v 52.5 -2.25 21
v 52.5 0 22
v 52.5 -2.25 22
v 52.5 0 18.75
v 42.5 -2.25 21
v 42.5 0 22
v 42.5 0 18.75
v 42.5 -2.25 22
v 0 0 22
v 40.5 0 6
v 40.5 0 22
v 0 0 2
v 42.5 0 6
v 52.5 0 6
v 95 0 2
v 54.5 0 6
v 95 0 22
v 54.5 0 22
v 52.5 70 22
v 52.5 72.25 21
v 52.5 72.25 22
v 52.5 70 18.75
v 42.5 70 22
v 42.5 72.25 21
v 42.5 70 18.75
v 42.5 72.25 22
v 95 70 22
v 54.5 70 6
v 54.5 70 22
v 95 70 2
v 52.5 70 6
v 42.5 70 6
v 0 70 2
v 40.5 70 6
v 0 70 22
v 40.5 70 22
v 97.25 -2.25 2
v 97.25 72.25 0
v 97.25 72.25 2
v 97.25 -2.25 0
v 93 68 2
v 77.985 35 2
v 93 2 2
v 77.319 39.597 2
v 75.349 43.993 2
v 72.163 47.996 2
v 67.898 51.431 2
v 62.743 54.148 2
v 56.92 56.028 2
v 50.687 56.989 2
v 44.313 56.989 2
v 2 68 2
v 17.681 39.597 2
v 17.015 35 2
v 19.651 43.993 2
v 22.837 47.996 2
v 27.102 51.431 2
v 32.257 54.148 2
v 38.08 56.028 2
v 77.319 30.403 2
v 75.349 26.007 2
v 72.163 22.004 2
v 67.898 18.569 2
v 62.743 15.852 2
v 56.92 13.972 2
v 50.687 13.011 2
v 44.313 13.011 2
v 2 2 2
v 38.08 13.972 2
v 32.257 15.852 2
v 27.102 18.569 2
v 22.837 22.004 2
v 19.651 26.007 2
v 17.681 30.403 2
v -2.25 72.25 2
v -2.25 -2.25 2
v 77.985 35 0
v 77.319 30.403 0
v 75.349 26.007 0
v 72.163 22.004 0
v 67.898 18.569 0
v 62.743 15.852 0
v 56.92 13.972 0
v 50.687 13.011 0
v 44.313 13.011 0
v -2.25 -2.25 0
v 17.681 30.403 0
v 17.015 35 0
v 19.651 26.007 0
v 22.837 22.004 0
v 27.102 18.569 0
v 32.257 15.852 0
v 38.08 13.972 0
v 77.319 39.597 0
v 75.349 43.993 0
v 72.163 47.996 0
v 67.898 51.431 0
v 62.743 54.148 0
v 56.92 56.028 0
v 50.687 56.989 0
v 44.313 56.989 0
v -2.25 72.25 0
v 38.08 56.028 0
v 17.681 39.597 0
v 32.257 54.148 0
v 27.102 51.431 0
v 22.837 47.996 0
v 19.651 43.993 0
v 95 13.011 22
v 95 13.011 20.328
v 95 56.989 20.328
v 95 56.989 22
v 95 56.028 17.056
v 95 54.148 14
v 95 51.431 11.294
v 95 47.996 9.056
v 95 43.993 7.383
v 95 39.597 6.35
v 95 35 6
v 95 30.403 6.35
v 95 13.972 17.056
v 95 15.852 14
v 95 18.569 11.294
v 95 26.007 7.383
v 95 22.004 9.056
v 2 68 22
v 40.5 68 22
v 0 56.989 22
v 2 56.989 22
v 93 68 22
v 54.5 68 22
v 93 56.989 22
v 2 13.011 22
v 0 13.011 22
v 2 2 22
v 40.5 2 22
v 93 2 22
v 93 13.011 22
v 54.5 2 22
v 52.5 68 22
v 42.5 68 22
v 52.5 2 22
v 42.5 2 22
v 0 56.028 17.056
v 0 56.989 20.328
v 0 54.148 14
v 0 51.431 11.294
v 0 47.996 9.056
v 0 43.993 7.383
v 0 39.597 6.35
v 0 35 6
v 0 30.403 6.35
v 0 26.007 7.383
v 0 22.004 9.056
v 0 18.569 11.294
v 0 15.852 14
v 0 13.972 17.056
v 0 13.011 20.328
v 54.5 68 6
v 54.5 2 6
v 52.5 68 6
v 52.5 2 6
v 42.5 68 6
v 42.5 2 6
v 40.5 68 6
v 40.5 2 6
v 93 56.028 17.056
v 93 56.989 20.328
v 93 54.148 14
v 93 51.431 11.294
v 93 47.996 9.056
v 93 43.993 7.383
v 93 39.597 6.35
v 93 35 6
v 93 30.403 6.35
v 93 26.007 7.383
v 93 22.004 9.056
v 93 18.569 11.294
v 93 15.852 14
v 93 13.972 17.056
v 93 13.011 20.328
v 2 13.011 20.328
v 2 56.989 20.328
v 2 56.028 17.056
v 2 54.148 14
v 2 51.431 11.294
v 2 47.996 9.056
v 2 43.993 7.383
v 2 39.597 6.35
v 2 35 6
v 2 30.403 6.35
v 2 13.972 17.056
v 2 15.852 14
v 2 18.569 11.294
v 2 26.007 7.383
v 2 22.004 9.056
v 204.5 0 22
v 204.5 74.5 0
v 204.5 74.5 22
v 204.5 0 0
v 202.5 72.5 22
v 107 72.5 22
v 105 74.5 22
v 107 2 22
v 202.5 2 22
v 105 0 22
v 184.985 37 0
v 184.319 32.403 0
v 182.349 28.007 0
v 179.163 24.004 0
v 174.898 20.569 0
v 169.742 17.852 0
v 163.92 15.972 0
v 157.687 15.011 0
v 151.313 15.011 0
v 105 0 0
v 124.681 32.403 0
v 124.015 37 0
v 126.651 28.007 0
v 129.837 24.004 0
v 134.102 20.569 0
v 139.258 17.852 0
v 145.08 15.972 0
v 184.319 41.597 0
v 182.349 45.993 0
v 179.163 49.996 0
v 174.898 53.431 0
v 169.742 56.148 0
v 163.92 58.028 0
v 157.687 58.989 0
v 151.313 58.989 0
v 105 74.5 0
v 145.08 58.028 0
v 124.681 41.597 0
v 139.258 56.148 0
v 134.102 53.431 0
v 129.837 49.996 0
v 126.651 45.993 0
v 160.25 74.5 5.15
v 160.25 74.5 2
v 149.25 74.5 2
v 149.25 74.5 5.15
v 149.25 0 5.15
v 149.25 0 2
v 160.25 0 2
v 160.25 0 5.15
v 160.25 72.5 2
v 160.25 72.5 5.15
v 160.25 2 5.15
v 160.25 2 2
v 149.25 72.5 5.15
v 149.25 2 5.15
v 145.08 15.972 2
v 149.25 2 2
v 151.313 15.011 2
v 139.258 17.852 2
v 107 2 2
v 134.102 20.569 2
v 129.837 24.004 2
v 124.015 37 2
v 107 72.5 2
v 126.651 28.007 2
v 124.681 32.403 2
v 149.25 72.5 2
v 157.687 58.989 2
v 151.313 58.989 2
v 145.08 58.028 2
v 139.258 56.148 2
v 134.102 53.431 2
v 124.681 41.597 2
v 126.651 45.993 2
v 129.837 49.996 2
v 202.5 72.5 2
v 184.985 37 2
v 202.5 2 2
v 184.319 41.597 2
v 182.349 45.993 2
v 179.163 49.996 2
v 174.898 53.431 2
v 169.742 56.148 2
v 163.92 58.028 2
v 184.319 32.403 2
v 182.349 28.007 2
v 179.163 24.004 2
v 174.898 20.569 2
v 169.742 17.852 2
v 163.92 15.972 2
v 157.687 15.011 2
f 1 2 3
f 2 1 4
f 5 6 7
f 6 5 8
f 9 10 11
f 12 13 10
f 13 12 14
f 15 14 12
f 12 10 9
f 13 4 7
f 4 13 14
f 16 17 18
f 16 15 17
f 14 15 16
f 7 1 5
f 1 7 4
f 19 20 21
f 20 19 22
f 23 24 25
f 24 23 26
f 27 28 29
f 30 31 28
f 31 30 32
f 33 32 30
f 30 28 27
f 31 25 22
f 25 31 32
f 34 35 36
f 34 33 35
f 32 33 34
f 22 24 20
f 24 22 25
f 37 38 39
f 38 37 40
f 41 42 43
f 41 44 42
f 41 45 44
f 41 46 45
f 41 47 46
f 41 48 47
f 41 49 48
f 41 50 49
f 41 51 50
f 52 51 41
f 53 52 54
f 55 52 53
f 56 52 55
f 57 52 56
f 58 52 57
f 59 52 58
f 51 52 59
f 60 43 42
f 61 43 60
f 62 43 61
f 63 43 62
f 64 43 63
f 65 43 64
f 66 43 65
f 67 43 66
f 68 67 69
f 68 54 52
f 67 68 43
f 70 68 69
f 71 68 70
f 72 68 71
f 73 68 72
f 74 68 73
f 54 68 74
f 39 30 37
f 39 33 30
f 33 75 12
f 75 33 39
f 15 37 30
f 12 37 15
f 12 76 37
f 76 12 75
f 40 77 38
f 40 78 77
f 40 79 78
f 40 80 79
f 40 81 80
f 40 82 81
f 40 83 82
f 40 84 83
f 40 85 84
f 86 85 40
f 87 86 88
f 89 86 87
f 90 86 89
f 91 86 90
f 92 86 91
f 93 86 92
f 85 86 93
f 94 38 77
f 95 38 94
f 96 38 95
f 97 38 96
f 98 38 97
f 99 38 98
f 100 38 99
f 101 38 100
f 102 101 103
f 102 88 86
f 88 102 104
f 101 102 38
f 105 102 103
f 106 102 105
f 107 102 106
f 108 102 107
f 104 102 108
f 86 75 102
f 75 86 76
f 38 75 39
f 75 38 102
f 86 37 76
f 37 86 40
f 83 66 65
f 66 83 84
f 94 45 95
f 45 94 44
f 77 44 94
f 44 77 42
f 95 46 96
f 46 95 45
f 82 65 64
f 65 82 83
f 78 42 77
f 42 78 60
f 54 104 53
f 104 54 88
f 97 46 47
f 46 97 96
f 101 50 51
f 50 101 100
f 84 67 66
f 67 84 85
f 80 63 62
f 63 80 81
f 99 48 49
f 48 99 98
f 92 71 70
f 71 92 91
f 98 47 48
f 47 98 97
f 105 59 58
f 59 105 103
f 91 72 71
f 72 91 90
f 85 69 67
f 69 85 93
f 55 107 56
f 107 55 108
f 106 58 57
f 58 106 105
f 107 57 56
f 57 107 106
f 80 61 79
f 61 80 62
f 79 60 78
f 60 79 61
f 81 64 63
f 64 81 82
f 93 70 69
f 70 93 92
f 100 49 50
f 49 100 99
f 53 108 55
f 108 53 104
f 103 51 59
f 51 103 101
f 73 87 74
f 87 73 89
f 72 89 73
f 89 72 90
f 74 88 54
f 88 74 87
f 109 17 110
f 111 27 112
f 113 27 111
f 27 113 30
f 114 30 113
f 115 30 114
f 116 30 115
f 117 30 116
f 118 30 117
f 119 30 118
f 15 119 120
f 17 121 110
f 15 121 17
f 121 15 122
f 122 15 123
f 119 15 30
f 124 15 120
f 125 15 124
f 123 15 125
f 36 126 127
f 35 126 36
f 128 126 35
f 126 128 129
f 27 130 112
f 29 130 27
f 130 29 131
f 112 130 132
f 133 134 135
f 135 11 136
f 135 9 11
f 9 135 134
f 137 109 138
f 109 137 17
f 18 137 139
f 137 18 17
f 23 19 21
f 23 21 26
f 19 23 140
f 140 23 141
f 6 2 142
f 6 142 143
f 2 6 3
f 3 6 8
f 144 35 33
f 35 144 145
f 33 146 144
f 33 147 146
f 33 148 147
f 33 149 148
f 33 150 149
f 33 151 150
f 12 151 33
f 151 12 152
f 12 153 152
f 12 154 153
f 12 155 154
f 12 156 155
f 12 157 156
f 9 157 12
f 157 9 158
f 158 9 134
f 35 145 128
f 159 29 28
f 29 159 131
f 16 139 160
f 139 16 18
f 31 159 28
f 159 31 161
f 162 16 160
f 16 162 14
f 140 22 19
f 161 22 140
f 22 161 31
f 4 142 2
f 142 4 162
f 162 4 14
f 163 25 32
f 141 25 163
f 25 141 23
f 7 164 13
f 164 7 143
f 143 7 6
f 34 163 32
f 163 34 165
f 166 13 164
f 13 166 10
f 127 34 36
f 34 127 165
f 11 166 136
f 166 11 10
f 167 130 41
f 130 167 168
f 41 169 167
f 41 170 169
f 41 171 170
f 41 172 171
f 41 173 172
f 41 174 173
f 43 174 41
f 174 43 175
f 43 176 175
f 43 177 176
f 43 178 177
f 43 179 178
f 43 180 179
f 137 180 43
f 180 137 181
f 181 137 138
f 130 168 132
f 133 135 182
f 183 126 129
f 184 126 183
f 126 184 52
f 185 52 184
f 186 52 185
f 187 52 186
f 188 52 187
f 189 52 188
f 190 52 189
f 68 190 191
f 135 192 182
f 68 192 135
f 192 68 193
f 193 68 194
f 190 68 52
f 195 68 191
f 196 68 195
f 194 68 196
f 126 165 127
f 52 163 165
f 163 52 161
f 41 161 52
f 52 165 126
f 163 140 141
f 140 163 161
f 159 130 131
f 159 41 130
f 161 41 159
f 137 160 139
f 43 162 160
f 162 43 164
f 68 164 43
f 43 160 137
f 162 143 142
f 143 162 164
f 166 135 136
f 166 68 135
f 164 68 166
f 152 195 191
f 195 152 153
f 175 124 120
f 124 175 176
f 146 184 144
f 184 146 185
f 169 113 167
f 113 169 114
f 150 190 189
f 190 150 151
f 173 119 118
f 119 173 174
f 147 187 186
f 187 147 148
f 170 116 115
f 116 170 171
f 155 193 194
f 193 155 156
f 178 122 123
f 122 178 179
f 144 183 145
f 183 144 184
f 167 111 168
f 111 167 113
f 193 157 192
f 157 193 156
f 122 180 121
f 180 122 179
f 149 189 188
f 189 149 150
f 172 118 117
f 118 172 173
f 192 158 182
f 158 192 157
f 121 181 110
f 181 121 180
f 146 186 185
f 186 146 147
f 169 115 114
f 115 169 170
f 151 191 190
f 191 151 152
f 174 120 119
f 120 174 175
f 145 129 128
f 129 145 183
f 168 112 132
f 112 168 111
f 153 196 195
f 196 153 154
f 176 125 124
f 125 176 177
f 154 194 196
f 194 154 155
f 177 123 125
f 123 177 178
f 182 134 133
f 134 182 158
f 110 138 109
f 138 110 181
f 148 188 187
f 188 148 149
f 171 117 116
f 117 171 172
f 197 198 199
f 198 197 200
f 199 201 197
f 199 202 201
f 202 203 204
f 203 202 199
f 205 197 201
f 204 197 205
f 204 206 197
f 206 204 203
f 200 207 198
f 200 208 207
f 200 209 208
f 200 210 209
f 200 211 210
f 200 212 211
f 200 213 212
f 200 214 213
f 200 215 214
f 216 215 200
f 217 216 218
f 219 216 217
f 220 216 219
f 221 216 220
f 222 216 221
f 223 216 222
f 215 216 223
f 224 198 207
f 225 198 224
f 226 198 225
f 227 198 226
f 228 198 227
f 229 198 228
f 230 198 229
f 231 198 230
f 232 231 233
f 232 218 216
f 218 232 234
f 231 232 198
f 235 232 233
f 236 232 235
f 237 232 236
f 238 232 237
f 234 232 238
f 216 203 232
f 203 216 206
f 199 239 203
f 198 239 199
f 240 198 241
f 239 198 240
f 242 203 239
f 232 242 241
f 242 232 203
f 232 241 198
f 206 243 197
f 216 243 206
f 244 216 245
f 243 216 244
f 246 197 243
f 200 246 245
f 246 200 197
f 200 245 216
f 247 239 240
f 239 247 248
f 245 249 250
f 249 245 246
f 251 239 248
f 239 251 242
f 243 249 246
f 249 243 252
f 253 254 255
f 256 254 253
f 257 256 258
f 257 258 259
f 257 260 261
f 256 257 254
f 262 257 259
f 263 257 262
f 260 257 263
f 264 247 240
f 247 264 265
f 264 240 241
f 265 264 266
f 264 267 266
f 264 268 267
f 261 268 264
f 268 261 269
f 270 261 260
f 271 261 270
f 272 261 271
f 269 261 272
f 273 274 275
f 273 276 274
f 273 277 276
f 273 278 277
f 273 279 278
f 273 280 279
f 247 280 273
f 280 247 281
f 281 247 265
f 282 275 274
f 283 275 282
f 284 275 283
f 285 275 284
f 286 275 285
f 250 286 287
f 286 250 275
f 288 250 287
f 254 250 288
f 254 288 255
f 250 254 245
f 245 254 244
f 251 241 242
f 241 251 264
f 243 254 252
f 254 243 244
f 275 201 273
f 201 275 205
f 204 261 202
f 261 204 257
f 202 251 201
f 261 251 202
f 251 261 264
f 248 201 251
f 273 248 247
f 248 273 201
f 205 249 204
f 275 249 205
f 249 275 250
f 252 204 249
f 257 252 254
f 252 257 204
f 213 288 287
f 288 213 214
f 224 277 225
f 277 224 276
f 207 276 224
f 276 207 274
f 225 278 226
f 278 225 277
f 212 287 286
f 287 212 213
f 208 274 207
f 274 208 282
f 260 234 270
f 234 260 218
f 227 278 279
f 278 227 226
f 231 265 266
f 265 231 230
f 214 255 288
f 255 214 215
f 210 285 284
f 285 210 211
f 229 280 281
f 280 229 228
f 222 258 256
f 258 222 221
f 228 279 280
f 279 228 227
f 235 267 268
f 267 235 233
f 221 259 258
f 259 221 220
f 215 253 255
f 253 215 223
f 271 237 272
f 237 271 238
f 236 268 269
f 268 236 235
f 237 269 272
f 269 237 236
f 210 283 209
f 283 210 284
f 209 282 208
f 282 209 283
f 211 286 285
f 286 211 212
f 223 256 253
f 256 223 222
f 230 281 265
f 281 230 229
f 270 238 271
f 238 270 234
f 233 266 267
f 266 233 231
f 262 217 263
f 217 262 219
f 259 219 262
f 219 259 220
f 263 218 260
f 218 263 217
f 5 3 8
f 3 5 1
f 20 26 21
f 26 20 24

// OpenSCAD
// [FL_INDEX: keywords="openscad, 3d_parametric, Customizable_Card_Box_with_More_Cutouts, csg_solid" | COT="Parametric OpenSCAD design from 3DCodeverse"]
// Title: Customizable Card Box with More Cutouts

CARD_SIZE_LONG_EDGE =91;
CARD_SIZE_SHORT_EDGE = 66;
CARD_STACK_HEIGHT = 20;
WALL_THICKNESS = 2;
TAB_THICKNESS = 10;
EXTRA_SPACE = .25;
// rounded cutouts remove a "circle" from the bottom surface, and a 1/2 "circle" from each short end of the bottom piece
/* [Cutouts] */
// Percent of card deck height to cutout
END_CUTOUT_HEIGHT_PERCENTAGE = 80; // [0:100]
// Percent of box width to cutout
END_CUTOUT_WIDTH_PERCENTAGE  = 67; // [0:100]
// Percent of box width to cutout
BOTTOM_CUTOUT_WIDTH_PERCENTAGE = 67; // [0:100]
// percent of box length to cutout
BOTTOM_CUTOUT_LENGTH_PERCENTAGE = 67; // [0:100]
// preview[view:south west, tilt:top diagonal]


CARD_LONG_EDGE = CARD_SIZE_LONG_EDGE + (WALL_THICKNESS*2);
CARD_SHORT_EDGE = CARD_SIZE_SHORT_EDGE + (WALL_THICKNESS*2);
ALL_EXTRA_SPACE = (EXTRA_SPACE *2);

LID_OUTSIDE_LONG_THICKNESS = CARD_LONG_EDGE + (WALL_THICKNESS*2);
LID_OUTSIDE_SHORT_THICKNESS = CARD_SHORT_EDGE + (WALL_THICKNESS*2);

SPACE_BETWEEN_BOTTOM_AND_LID = LID_OUTSIDE_LONG_THICKNESS + (WALL_THICKNESS*2)+ 2;

HEIGHT = CARD_STACK_HEIGHT + WALL_THICKNESS;

// rounded cut-outs
// ends
END_CUTOUT_LENGTH = CARD_LONG_EDGE + 2;
END_CUTOUT_RADIUS = CARD_STACK_HEIGHT * END_CUTOUT_HEIGHT_PERCENTAGE/100;
END_CUTOUT_WIDTH  = CARD_SIZE_SHORT_EDGE * END_CUTOUT_WIDTH_PERCENTAGE/100;
// since we'll be scaling our cylinder, we really need the ratio to scale by for the longer dimension, not the direct dimension itself
END_CUTOUT_WIDTH_RATIO = END_CUTOUT_WIDTH / (END_CUTOUT_RADIUS*2);
// bottom
BOTTOM_CUTOUT_LENGTH = (WALL_THICKNESS * 2)+ 2;
BOTTOM_CUTOUT_RADIUS = CARD_SIZE_SHORT_EDGE * BOTTOM_CUTOUT_WIDTH_PERCENTAGE / 2 /100;
BOTTOM_CUTOUT_HEIGHT = CARD_SIZE_LONG_EDGE * BOTTOM_CUTOUT_LENGTH_PERCENTAGE/100;
// since we'll be scaling our cylinder, we really need the ratio to scale by for the longer dimension, not the direct dimension itself
BOTTOM_CUTOUT_HEIGHT_RATIO = BOTTOM_CUTOUT_HEIGHT / (BOTTOM_CUTOUT_RADIUS*2);


	//*Start Bottom of Box

					//*Start wedge 1
translate ([((CARD_LONG_EDGE/2) -(TAB_THICKNESS/2)),-WALL_THICKNESS-EXTRA_SPACE,HEIGHT-WALL_THICKNESS-1-EXTRA_SPACE]) 

difference (){
cube ([TAB_THICKNESS,WALL_THICKNESS+EXTRA_SPACE,WALL_THICKNESS+EXTRA_SPACE]);
translate ([0, WALL_THICKNESS+(EXTRA_SPACE),0]) rotate ([135,0,0])  

cube ([(TAB_THICKNESS+3), sqrt(((WALL_THICKNESS+EXTRA_SPACE)*(WALL_THICKNESS+EXTRA_SPACE))+((WALL_THICKNESS+EXTRA_SPACE)*(WALL_THICKNESS+EXTRA_SPACE))), sqrt(((WALL_THICKNESS+EXTRA_SPACE)*(WALL_THICKNESS+EXTRA_SPACE))+((WALL_THICKNESS+EXTRA_SPACE)*(WALL_THICKNESS+EXTRA_SPACE)))]);

}
			//*end wedge 1


			//*Start wedge 2
translate ([((CARD_LONG_EDGE/2) - (TAB_THICKNESS/2)),CARD_SHORT_EDGE,HEIGHT-WALL_THICKNESS-1-EXTRA_SPACE])

 difference (){
cube ([TAB_THICKNESS,WALL_THICKNESS+EXTRA_SPACE,WALL_THICKNESS+EXTRA_SPACE]);

translate ([0 ,0 ,0]) rotate ([-45,0,0])  cube ([(TAB_THICKNESS+3),sqrt(((WALL_THICKNESS+EXTRA_SPACE)*(WALL_THICKNESS+EXTRA_SPACE))+((WALL_THICKNESS+EXTRA_SPACE)*(WALL_THICKNESS+EXTRA_SPACE))),sqrt(((WALL_THICKNESS+EXTRA_SPACE)*(WALL_THICKNESS+EXTRA_SPACE))+((WALL_THICKNESS+EXTRA_SPACE)*(WALL_THICKNESS+EXTRA_SPACE)))]);
}
			//*end wedge 2


translate ([((CARD_LONG_EDGE/2) -(TAB_THICKNESS/2)),-WALL_THICKNESS-EXTRA_SPACE,HEIGHT-1])  cube ([TAB_THICKNESS, WALL_THICKNESS+EXTRA_SPACE, 1]); 					//*Tab

translate ([((CARD_LONG_EDGE/2) -(TAB_THICKNESS/2)),CARD_SHORT_EDGE,HEIGHT-1])  cube ([TAB_THICKNESS, WALL_THICKNESS+EXTRA_SPACE, 1]);				//*Tab

difference()
{
	translate ([-WALL_THICKNESS-EXTRA_SPACE, -WALL_THICKNESS-EXTRA_SPACE, 0 ]) cube ([CARD_LONG_EDGE + (WALL_THICKNESS*2)+ALL_EXTRA_SPACE, CARD_SHORT_EDGE + (WALL_THICKNESS*2)+ALL_EXTRA_SPACE, WALL_THICKNESS]);  						//*Bottom Plate

	translate([CARD_LONG_EDGE/2,CARD_SHORT_EDGE/2,-WALL_THICKNESS]) scale([BOTTOM_CUTOUT_HEIGHT_RATIO,1,1]) cylinder(h=BOTTOM_CUTOUT_LENGTH,r=BOTTOM_CUTOUT_RADIUS);  //*Bottom cutout to cut through bottom plate
}

difference() 
{
	cube ([CARD_LONG_EDGE,CARD_SHORT_EDGE,HEIGHT]);		//*Main Body

	translate([ ((CARD_LONG_EDGE / 2) + (TAB_THICKNESS/2)), -.5, ((HEIGHT+ WALL_THICKNESS) / 4) ]) cube ([2, CARD_SHORT_EDGE + 2, HEIGHT]);	//*Tab cutout
	
	translate([ ((CARD_LONG_EDGE / 2) - ((TAB_THICKNESS/2)+2)), -.5, ((HEIGHT+ WALL_THICKNESS)/ 4) ]) cube ([2, CARD_SHORT_EDGE + 2, HEIGHT ]);  //*Tab cutout

	translate([WALL_THICKNESS,WALL_THICKNESS,WALL_THICKNESS]) cube ([CARD_LONG_EDGE - (WALL_THICKNESS*2),CARD_SHORT_EDGE - (WALL_THICKNESS*2),HEIGHT]);			//*Hole

    translate([-WALL_THICKNESS/2,CARD_SHORT_EDGE/2,HEIGHT]) scale([1,END_CUTOUT_WIDTH_RATIO,1]) rotate([0,90,0]) cylinder(h=END_CUTOUT_LENGTH,r=END_CUTOUT_RADIUS);  //*End cutout
	translate([CARD_LONG_EDGE/2,CARD_SHORT_EDGE/2,-WALL_THICKNESS]) scale([BOTTOM_CUTOUT_HEIGHT_RATIO,1,1]) cylinder(h=BOTTOM_CUTOUT_LENGTH,r=BOTTOM_CUTOUT_RADIUS);  //*Bottom cutout to cut through main box
}
			//*End Bottom of Box



			//*Start Top of Box


translate ([SPACE_BETWEEN_BOTTOM_AND_LID, 0, 0]) 


difference() 
{
	cube ([LID_OUTSIDE_LONG_THICKNESS+ALL_EXTRA_SPACE, LID_OUTSIDE_SHORT_THICKNESS+ALL_EXTRA_SPACE, HEIGHT]); 		//*Top Main Body


	translate([ ((LID_OUTSIDE_LONG_THICKNESS+ALL_EXTRA_SPACE) / 2)-((TAB_THICKNESS+1)/2), -.5, WALL_THICKNESS]) 
cube ([(TAB_THICKNESS+1), LID_OUTSIDE_SHORT_THICKNESS + 2, WALL_THICKNESS+1.15 ]); 	//*Tab Hole

	translate([WALL_THICKNESS,WALL_THICKNESS, WALL_THICKNESS]) 
cube ([LID_OUTSIDE_LONG_THICKNESS - (WALL_THICKNESS*2)+ALL_EXTRA_SPACE,LID_OUTSIDE_SHORT_THICKNESS - (WALL_THICKNESS*2)+ALL_EXTRA_SPACE,HEIGHT]);		//*Hole
translate([LID_OUTSIDE_LONG_THICKNESS/2,LID_OUTSIDE_SHORT_THICKNESS/2,-WALL_THICKNESS]) scale([BOTTOM_CUTOUT_HEIGHT_RATIO,1,1]) cylinder(h=BOTTOM_CUTOUT_LENGTH,r=BOTTOM_CUTOUT_RADIUS);  //*Bottom cutout to cut through main box
}

			//* End Top of Box
